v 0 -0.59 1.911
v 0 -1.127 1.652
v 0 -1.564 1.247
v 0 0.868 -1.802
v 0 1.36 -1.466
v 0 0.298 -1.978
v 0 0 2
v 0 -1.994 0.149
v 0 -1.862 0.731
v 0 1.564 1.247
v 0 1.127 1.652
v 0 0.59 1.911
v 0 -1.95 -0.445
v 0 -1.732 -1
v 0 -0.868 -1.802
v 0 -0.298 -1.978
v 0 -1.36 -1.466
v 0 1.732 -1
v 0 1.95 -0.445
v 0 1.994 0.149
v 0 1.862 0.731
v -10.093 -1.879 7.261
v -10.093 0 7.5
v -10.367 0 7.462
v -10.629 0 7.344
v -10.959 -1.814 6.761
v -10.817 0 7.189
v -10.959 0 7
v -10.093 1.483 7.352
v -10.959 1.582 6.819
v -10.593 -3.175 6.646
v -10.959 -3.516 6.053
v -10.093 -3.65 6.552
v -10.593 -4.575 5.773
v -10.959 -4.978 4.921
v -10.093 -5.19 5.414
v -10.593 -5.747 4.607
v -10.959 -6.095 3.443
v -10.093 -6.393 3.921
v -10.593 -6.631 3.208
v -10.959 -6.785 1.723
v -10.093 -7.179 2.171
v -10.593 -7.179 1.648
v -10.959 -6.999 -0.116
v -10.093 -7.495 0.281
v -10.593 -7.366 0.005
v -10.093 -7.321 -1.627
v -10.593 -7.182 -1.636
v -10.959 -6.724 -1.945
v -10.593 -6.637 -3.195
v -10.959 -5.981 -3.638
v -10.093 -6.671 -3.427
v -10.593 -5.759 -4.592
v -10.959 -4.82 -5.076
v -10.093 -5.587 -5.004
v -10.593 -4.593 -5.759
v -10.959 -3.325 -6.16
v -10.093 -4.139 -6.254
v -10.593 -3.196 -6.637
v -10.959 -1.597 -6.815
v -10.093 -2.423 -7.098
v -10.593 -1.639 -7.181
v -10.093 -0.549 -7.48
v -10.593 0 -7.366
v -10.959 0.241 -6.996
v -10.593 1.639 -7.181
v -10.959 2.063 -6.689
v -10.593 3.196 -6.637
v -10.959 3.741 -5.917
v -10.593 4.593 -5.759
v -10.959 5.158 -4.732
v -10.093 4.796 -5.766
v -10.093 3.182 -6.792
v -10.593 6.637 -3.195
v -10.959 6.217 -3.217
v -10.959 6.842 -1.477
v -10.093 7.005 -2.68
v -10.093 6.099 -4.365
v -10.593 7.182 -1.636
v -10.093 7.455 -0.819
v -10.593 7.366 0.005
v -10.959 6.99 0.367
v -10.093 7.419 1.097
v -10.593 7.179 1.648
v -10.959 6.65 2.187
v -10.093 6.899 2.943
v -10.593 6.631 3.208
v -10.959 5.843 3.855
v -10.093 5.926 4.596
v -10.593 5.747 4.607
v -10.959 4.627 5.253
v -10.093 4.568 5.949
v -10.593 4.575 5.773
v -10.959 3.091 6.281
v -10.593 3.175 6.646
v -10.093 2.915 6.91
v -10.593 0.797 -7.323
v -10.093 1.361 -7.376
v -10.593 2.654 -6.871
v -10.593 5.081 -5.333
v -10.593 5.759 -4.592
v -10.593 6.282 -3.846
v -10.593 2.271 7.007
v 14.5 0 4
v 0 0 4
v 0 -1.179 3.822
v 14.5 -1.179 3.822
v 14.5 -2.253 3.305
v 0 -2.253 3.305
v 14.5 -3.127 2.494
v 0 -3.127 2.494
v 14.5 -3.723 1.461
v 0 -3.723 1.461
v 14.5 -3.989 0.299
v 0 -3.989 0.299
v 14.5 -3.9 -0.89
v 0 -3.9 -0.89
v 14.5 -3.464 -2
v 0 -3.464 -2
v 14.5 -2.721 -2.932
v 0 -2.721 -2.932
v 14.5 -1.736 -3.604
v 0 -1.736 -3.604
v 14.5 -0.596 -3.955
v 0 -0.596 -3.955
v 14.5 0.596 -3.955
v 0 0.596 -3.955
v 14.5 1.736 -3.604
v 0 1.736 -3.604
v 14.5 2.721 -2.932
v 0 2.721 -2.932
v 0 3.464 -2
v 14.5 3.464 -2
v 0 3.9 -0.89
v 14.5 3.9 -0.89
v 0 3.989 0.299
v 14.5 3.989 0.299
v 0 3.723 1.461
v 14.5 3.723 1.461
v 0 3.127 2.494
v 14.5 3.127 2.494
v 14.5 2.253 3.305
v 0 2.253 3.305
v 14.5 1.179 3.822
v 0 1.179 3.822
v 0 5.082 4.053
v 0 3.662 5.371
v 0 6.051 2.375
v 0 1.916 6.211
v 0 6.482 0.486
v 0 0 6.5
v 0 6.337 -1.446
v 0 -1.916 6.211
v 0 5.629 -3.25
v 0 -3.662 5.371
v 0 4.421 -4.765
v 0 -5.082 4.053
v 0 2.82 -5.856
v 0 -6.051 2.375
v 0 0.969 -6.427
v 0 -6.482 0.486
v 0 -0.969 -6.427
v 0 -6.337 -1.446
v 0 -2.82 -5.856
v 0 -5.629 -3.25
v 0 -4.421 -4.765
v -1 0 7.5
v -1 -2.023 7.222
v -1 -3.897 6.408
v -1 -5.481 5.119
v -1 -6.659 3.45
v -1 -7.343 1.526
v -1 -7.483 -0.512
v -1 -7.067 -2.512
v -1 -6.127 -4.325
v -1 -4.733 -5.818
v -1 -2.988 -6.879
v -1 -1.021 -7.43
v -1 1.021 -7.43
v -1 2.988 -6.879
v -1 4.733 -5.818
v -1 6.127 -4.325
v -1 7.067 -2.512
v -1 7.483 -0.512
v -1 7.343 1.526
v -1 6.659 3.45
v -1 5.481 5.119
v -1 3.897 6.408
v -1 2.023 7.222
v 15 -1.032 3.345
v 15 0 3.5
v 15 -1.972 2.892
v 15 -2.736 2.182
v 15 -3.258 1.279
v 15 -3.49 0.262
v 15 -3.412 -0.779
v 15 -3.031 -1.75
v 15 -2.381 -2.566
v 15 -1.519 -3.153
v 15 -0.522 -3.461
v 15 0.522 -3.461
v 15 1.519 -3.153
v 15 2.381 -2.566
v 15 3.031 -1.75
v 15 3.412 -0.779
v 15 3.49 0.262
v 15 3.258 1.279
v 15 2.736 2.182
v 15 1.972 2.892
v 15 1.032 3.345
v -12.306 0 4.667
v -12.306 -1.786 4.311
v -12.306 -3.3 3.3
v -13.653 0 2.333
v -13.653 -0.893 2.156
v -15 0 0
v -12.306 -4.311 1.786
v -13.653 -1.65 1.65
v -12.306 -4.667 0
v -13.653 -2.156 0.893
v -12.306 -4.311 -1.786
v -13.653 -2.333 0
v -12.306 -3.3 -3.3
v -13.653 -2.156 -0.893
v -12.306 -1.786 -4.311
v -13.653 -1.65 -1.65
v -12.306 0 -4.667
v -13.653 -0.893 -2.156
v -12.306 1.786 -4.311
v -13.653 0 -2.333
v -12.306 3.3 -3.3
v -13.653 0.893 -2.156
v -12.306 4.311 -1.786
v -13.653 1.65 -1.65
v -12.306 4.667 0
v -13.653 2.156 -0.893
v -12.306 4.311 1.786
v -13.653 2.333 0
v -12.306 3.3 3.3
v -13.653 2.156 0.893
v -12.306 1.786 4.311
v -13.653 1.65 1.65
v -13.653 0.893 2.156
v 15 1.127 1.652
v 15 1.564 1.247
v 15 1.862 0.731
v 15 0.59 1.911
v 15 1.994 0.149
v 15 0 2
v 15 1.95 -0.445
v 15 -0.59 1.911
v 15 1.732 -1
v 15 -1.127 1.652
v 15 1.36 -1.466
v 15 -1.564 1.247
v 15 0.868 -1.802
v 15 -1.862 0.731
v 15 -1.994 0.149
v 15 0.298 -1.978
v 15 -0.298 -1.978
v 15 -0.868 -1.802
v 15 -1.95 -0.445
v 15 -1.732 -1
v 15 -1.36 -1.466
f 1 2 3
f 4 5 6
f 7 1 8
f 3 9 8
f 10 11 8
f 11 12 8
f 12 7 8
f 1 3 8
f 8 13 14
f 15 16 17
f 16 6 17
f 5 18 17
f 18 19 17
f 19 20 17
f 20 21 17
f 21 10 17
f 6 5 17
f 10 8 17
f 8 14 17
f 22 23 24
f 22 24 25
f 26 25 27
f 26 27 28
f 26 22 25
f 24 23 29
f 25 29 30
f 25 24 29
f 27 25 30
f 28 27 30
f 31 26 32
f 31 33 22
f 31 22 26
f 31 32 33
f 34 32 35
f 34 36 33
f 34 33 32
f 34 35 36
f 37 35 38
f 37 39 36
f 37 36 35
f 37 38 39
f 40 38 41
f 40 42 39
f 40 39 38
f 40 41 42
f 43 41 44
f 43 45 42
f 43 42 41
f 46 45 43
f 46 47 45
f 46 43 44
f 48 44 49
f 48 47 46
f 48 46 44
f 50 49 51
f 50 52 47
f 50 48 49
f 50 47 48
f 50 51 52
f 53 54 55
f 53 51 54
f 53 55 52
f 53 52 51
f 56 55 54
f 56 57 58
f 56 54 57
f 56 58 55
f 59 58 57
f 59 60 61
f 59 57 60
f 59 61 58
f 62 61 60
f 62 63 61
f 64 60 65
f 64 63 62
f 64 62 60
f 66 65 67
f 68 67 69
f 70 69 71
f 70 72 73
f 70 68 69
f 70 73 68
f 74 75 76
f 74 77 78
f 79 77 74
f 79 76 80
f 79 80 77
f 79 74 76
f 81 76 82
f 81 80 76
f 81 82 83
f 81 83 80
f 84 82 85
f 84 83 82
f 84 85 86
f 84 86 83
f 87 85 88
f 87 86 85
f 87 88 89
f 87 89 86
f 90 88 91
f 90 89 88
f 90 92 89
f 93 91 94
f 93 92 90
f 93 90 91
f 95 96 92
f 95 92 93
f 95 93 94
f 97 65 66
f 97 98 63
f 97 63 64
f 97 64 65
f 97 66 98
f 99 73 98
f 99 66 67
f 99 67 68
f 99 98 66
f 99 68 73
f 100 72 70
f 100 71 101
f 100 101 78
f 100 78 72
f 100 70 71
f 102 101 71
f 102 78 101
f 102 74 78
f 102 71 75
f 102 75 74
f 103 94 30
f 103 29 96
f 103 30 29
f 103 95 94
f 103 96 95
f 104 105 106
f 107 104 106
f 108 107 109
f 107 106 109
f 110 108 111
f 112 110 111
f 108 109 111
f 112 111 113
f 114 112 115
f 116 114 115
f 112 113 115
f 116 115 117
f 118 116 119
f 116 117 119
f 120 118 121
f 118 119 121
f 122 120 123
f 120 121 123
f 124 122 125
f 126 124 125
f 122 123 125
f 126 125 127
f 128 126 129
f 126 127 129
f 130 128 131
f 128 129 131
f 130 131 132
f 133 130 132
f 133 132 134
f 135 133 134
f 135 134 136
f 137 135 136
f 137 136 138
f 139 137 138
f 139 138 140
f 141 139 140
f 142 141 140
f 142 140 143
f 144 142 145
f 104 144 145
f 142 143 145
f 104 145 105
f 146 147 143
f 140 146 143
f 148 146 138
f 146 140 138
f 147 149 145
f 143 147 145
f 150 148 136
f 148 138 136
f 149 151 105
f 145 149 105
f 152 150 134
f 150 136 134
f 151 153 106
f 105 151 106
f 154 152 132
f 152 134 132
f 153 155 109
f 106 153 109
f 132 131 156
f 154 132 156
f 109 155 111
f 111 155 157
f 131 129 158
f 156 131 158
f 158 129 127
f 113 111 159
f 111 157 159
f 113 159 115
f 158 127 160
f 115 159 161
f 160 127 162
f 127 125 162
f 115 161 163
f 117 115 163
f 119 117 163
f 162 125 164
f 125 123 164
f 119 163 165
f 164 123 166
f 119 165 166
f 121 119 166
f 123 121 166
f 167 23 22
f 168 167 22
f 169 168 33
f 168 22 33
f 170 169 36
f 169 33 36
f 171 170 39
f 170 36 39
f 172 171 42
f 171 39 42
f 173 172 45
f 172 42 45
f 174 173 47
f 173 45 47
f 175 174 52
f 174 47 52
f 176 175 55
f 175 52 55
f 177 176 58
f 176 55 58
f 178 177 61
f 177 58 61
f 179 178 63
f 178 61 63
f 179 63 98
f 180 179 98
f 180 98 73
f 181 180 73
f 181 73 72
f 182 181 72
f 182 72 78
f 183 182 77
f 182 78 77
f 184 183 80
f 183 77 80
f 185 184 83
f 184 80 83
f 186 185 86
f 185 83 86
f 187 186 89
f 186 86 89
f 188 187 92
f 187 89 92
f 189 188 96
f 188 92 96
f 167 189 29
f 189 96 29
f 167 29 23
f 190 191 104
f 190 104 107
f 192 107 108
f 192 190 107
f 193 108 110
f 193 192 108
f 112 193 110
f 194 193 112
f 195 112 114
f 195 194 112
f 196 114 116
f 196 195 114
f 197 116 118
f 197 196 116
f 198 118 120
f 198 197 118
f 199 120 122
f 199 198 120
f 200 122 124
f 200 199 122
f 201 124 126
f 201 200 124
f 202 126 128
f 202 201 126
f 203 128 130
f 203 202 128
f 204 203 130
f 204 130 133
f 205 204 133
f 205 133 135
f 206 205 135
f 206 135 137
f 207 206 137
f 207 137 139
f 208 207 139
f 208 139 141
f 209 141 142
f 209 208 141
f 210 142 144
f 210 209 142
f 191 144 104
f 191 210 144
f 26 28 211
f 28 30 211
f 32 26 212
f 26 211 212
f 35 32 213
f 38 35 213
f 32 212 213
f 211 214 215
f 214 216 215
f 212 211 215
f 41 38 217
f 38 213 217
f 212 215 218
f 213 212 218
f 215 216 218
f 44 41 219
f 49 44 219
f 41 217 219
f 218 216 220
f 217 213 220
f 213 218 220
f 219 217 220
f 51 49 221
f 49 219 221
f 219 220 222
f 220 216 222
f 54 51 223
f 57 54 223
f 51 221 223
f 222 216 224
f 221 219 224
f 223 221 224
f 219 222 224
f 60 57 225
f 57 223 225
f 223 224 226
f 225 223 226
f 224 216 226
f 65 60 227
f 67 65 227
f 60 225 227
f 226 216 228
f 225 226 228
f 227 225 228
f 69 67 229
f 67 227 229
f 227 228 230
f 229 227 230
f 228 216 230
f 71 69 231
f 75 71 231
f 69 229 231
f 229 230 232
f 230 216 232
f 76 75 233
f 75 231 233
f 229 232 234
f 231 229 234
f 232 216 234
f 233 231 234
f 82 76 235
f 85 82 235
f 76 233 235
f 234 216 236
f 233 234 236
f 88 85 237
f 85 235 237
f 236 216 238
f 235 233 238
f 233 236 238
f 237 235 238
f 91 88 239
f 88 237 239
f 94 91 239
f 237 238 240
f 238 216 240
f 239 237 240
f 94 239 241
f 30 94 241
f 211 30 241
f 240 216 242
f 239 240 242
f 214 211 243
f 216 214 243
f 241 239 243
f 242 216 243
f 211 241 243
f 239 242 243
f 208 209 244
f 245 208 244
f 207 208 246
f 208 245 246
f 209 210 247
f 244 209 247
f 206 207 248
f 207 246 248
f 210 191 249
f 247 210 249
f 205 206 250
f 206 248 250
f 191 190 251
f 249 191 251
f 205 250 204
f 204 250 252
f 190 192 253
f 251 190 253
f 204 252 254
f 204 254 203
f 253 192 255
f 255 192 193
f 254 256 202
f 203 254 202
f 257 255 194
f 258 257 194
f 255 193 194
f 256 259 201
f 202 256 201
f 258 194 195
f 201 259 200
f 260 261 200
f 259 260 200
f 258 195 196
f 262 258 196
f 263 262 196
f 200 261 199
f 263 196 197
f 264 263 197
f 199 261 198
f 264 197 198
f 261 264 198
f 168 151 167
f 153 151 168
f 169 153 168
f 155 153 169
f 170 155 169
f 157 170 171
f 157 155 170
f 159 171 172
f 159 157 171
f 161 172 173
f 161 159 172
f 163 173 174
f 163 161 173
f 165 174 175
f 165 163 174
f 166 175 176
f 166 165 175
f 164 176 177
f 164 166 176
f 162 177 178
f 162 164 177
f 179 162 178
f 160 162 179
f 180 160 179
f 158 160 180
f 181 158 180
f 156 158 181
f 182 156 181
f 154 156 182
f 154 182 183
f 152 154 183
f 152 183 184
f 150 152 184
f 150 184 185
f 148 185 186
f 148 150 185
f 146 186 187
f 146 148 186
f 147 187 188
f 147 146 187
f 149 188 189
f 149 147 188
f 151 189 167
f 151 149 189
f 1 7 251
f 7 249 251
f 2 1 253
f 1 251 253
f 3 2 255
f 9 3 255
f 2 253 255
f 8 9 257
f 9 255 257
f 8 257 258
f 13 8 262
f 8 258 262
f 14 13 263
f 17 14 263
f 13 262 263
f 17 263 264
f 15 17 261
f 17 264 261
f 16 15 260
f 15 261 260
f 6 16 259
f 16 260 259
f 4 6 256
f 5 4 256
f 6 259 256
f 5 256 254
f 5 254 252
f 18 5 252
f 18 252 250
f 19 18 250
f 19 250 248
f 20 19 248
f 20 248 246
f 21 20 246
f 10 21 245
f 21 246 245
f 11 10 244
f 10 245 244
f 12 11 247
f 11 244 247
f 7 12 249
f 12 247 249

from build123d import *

# Parameters (mm, degrees)
F2_R    = 1
F3_SIZE = 1
F4_SIZE = 0.5


with BuildPart() as f1:
    # F0 (on Front) → F1 (revolve)
    with BuildSketch(Plane.XZ):
        Polygon((0, 7.5), (-10.669873, 7.5), (-15, 0), (0, 0), (0, 2), (15, 2), (15, 4), (0, 4), align=None)
    revolve(axis=Axis((-7.5, 0, 0), (1, 0, 0)))

    # F2
    f2_edges = [f1.edges().sort_by_distance(p)[0] for p in [
        (-10.669873, 0, -7.5),
    ]]
    fillet(f2_edges, radius=F2_R)

    # F3
    f3_edges = [f1.edges().sort_by_distance(p)[0] for p in [
        (0, 0, -7.5),
    ]]
    chamfer(f3_edges, length=F3_SIZE)

    # F4
    f4_edges = [f1.edges().sort_by_distance(p)[0] for p in [
        (15, 0, -4),
    ]]
    chamfer(f4_edges, length=F4_SIZE)


solid = f1.part
